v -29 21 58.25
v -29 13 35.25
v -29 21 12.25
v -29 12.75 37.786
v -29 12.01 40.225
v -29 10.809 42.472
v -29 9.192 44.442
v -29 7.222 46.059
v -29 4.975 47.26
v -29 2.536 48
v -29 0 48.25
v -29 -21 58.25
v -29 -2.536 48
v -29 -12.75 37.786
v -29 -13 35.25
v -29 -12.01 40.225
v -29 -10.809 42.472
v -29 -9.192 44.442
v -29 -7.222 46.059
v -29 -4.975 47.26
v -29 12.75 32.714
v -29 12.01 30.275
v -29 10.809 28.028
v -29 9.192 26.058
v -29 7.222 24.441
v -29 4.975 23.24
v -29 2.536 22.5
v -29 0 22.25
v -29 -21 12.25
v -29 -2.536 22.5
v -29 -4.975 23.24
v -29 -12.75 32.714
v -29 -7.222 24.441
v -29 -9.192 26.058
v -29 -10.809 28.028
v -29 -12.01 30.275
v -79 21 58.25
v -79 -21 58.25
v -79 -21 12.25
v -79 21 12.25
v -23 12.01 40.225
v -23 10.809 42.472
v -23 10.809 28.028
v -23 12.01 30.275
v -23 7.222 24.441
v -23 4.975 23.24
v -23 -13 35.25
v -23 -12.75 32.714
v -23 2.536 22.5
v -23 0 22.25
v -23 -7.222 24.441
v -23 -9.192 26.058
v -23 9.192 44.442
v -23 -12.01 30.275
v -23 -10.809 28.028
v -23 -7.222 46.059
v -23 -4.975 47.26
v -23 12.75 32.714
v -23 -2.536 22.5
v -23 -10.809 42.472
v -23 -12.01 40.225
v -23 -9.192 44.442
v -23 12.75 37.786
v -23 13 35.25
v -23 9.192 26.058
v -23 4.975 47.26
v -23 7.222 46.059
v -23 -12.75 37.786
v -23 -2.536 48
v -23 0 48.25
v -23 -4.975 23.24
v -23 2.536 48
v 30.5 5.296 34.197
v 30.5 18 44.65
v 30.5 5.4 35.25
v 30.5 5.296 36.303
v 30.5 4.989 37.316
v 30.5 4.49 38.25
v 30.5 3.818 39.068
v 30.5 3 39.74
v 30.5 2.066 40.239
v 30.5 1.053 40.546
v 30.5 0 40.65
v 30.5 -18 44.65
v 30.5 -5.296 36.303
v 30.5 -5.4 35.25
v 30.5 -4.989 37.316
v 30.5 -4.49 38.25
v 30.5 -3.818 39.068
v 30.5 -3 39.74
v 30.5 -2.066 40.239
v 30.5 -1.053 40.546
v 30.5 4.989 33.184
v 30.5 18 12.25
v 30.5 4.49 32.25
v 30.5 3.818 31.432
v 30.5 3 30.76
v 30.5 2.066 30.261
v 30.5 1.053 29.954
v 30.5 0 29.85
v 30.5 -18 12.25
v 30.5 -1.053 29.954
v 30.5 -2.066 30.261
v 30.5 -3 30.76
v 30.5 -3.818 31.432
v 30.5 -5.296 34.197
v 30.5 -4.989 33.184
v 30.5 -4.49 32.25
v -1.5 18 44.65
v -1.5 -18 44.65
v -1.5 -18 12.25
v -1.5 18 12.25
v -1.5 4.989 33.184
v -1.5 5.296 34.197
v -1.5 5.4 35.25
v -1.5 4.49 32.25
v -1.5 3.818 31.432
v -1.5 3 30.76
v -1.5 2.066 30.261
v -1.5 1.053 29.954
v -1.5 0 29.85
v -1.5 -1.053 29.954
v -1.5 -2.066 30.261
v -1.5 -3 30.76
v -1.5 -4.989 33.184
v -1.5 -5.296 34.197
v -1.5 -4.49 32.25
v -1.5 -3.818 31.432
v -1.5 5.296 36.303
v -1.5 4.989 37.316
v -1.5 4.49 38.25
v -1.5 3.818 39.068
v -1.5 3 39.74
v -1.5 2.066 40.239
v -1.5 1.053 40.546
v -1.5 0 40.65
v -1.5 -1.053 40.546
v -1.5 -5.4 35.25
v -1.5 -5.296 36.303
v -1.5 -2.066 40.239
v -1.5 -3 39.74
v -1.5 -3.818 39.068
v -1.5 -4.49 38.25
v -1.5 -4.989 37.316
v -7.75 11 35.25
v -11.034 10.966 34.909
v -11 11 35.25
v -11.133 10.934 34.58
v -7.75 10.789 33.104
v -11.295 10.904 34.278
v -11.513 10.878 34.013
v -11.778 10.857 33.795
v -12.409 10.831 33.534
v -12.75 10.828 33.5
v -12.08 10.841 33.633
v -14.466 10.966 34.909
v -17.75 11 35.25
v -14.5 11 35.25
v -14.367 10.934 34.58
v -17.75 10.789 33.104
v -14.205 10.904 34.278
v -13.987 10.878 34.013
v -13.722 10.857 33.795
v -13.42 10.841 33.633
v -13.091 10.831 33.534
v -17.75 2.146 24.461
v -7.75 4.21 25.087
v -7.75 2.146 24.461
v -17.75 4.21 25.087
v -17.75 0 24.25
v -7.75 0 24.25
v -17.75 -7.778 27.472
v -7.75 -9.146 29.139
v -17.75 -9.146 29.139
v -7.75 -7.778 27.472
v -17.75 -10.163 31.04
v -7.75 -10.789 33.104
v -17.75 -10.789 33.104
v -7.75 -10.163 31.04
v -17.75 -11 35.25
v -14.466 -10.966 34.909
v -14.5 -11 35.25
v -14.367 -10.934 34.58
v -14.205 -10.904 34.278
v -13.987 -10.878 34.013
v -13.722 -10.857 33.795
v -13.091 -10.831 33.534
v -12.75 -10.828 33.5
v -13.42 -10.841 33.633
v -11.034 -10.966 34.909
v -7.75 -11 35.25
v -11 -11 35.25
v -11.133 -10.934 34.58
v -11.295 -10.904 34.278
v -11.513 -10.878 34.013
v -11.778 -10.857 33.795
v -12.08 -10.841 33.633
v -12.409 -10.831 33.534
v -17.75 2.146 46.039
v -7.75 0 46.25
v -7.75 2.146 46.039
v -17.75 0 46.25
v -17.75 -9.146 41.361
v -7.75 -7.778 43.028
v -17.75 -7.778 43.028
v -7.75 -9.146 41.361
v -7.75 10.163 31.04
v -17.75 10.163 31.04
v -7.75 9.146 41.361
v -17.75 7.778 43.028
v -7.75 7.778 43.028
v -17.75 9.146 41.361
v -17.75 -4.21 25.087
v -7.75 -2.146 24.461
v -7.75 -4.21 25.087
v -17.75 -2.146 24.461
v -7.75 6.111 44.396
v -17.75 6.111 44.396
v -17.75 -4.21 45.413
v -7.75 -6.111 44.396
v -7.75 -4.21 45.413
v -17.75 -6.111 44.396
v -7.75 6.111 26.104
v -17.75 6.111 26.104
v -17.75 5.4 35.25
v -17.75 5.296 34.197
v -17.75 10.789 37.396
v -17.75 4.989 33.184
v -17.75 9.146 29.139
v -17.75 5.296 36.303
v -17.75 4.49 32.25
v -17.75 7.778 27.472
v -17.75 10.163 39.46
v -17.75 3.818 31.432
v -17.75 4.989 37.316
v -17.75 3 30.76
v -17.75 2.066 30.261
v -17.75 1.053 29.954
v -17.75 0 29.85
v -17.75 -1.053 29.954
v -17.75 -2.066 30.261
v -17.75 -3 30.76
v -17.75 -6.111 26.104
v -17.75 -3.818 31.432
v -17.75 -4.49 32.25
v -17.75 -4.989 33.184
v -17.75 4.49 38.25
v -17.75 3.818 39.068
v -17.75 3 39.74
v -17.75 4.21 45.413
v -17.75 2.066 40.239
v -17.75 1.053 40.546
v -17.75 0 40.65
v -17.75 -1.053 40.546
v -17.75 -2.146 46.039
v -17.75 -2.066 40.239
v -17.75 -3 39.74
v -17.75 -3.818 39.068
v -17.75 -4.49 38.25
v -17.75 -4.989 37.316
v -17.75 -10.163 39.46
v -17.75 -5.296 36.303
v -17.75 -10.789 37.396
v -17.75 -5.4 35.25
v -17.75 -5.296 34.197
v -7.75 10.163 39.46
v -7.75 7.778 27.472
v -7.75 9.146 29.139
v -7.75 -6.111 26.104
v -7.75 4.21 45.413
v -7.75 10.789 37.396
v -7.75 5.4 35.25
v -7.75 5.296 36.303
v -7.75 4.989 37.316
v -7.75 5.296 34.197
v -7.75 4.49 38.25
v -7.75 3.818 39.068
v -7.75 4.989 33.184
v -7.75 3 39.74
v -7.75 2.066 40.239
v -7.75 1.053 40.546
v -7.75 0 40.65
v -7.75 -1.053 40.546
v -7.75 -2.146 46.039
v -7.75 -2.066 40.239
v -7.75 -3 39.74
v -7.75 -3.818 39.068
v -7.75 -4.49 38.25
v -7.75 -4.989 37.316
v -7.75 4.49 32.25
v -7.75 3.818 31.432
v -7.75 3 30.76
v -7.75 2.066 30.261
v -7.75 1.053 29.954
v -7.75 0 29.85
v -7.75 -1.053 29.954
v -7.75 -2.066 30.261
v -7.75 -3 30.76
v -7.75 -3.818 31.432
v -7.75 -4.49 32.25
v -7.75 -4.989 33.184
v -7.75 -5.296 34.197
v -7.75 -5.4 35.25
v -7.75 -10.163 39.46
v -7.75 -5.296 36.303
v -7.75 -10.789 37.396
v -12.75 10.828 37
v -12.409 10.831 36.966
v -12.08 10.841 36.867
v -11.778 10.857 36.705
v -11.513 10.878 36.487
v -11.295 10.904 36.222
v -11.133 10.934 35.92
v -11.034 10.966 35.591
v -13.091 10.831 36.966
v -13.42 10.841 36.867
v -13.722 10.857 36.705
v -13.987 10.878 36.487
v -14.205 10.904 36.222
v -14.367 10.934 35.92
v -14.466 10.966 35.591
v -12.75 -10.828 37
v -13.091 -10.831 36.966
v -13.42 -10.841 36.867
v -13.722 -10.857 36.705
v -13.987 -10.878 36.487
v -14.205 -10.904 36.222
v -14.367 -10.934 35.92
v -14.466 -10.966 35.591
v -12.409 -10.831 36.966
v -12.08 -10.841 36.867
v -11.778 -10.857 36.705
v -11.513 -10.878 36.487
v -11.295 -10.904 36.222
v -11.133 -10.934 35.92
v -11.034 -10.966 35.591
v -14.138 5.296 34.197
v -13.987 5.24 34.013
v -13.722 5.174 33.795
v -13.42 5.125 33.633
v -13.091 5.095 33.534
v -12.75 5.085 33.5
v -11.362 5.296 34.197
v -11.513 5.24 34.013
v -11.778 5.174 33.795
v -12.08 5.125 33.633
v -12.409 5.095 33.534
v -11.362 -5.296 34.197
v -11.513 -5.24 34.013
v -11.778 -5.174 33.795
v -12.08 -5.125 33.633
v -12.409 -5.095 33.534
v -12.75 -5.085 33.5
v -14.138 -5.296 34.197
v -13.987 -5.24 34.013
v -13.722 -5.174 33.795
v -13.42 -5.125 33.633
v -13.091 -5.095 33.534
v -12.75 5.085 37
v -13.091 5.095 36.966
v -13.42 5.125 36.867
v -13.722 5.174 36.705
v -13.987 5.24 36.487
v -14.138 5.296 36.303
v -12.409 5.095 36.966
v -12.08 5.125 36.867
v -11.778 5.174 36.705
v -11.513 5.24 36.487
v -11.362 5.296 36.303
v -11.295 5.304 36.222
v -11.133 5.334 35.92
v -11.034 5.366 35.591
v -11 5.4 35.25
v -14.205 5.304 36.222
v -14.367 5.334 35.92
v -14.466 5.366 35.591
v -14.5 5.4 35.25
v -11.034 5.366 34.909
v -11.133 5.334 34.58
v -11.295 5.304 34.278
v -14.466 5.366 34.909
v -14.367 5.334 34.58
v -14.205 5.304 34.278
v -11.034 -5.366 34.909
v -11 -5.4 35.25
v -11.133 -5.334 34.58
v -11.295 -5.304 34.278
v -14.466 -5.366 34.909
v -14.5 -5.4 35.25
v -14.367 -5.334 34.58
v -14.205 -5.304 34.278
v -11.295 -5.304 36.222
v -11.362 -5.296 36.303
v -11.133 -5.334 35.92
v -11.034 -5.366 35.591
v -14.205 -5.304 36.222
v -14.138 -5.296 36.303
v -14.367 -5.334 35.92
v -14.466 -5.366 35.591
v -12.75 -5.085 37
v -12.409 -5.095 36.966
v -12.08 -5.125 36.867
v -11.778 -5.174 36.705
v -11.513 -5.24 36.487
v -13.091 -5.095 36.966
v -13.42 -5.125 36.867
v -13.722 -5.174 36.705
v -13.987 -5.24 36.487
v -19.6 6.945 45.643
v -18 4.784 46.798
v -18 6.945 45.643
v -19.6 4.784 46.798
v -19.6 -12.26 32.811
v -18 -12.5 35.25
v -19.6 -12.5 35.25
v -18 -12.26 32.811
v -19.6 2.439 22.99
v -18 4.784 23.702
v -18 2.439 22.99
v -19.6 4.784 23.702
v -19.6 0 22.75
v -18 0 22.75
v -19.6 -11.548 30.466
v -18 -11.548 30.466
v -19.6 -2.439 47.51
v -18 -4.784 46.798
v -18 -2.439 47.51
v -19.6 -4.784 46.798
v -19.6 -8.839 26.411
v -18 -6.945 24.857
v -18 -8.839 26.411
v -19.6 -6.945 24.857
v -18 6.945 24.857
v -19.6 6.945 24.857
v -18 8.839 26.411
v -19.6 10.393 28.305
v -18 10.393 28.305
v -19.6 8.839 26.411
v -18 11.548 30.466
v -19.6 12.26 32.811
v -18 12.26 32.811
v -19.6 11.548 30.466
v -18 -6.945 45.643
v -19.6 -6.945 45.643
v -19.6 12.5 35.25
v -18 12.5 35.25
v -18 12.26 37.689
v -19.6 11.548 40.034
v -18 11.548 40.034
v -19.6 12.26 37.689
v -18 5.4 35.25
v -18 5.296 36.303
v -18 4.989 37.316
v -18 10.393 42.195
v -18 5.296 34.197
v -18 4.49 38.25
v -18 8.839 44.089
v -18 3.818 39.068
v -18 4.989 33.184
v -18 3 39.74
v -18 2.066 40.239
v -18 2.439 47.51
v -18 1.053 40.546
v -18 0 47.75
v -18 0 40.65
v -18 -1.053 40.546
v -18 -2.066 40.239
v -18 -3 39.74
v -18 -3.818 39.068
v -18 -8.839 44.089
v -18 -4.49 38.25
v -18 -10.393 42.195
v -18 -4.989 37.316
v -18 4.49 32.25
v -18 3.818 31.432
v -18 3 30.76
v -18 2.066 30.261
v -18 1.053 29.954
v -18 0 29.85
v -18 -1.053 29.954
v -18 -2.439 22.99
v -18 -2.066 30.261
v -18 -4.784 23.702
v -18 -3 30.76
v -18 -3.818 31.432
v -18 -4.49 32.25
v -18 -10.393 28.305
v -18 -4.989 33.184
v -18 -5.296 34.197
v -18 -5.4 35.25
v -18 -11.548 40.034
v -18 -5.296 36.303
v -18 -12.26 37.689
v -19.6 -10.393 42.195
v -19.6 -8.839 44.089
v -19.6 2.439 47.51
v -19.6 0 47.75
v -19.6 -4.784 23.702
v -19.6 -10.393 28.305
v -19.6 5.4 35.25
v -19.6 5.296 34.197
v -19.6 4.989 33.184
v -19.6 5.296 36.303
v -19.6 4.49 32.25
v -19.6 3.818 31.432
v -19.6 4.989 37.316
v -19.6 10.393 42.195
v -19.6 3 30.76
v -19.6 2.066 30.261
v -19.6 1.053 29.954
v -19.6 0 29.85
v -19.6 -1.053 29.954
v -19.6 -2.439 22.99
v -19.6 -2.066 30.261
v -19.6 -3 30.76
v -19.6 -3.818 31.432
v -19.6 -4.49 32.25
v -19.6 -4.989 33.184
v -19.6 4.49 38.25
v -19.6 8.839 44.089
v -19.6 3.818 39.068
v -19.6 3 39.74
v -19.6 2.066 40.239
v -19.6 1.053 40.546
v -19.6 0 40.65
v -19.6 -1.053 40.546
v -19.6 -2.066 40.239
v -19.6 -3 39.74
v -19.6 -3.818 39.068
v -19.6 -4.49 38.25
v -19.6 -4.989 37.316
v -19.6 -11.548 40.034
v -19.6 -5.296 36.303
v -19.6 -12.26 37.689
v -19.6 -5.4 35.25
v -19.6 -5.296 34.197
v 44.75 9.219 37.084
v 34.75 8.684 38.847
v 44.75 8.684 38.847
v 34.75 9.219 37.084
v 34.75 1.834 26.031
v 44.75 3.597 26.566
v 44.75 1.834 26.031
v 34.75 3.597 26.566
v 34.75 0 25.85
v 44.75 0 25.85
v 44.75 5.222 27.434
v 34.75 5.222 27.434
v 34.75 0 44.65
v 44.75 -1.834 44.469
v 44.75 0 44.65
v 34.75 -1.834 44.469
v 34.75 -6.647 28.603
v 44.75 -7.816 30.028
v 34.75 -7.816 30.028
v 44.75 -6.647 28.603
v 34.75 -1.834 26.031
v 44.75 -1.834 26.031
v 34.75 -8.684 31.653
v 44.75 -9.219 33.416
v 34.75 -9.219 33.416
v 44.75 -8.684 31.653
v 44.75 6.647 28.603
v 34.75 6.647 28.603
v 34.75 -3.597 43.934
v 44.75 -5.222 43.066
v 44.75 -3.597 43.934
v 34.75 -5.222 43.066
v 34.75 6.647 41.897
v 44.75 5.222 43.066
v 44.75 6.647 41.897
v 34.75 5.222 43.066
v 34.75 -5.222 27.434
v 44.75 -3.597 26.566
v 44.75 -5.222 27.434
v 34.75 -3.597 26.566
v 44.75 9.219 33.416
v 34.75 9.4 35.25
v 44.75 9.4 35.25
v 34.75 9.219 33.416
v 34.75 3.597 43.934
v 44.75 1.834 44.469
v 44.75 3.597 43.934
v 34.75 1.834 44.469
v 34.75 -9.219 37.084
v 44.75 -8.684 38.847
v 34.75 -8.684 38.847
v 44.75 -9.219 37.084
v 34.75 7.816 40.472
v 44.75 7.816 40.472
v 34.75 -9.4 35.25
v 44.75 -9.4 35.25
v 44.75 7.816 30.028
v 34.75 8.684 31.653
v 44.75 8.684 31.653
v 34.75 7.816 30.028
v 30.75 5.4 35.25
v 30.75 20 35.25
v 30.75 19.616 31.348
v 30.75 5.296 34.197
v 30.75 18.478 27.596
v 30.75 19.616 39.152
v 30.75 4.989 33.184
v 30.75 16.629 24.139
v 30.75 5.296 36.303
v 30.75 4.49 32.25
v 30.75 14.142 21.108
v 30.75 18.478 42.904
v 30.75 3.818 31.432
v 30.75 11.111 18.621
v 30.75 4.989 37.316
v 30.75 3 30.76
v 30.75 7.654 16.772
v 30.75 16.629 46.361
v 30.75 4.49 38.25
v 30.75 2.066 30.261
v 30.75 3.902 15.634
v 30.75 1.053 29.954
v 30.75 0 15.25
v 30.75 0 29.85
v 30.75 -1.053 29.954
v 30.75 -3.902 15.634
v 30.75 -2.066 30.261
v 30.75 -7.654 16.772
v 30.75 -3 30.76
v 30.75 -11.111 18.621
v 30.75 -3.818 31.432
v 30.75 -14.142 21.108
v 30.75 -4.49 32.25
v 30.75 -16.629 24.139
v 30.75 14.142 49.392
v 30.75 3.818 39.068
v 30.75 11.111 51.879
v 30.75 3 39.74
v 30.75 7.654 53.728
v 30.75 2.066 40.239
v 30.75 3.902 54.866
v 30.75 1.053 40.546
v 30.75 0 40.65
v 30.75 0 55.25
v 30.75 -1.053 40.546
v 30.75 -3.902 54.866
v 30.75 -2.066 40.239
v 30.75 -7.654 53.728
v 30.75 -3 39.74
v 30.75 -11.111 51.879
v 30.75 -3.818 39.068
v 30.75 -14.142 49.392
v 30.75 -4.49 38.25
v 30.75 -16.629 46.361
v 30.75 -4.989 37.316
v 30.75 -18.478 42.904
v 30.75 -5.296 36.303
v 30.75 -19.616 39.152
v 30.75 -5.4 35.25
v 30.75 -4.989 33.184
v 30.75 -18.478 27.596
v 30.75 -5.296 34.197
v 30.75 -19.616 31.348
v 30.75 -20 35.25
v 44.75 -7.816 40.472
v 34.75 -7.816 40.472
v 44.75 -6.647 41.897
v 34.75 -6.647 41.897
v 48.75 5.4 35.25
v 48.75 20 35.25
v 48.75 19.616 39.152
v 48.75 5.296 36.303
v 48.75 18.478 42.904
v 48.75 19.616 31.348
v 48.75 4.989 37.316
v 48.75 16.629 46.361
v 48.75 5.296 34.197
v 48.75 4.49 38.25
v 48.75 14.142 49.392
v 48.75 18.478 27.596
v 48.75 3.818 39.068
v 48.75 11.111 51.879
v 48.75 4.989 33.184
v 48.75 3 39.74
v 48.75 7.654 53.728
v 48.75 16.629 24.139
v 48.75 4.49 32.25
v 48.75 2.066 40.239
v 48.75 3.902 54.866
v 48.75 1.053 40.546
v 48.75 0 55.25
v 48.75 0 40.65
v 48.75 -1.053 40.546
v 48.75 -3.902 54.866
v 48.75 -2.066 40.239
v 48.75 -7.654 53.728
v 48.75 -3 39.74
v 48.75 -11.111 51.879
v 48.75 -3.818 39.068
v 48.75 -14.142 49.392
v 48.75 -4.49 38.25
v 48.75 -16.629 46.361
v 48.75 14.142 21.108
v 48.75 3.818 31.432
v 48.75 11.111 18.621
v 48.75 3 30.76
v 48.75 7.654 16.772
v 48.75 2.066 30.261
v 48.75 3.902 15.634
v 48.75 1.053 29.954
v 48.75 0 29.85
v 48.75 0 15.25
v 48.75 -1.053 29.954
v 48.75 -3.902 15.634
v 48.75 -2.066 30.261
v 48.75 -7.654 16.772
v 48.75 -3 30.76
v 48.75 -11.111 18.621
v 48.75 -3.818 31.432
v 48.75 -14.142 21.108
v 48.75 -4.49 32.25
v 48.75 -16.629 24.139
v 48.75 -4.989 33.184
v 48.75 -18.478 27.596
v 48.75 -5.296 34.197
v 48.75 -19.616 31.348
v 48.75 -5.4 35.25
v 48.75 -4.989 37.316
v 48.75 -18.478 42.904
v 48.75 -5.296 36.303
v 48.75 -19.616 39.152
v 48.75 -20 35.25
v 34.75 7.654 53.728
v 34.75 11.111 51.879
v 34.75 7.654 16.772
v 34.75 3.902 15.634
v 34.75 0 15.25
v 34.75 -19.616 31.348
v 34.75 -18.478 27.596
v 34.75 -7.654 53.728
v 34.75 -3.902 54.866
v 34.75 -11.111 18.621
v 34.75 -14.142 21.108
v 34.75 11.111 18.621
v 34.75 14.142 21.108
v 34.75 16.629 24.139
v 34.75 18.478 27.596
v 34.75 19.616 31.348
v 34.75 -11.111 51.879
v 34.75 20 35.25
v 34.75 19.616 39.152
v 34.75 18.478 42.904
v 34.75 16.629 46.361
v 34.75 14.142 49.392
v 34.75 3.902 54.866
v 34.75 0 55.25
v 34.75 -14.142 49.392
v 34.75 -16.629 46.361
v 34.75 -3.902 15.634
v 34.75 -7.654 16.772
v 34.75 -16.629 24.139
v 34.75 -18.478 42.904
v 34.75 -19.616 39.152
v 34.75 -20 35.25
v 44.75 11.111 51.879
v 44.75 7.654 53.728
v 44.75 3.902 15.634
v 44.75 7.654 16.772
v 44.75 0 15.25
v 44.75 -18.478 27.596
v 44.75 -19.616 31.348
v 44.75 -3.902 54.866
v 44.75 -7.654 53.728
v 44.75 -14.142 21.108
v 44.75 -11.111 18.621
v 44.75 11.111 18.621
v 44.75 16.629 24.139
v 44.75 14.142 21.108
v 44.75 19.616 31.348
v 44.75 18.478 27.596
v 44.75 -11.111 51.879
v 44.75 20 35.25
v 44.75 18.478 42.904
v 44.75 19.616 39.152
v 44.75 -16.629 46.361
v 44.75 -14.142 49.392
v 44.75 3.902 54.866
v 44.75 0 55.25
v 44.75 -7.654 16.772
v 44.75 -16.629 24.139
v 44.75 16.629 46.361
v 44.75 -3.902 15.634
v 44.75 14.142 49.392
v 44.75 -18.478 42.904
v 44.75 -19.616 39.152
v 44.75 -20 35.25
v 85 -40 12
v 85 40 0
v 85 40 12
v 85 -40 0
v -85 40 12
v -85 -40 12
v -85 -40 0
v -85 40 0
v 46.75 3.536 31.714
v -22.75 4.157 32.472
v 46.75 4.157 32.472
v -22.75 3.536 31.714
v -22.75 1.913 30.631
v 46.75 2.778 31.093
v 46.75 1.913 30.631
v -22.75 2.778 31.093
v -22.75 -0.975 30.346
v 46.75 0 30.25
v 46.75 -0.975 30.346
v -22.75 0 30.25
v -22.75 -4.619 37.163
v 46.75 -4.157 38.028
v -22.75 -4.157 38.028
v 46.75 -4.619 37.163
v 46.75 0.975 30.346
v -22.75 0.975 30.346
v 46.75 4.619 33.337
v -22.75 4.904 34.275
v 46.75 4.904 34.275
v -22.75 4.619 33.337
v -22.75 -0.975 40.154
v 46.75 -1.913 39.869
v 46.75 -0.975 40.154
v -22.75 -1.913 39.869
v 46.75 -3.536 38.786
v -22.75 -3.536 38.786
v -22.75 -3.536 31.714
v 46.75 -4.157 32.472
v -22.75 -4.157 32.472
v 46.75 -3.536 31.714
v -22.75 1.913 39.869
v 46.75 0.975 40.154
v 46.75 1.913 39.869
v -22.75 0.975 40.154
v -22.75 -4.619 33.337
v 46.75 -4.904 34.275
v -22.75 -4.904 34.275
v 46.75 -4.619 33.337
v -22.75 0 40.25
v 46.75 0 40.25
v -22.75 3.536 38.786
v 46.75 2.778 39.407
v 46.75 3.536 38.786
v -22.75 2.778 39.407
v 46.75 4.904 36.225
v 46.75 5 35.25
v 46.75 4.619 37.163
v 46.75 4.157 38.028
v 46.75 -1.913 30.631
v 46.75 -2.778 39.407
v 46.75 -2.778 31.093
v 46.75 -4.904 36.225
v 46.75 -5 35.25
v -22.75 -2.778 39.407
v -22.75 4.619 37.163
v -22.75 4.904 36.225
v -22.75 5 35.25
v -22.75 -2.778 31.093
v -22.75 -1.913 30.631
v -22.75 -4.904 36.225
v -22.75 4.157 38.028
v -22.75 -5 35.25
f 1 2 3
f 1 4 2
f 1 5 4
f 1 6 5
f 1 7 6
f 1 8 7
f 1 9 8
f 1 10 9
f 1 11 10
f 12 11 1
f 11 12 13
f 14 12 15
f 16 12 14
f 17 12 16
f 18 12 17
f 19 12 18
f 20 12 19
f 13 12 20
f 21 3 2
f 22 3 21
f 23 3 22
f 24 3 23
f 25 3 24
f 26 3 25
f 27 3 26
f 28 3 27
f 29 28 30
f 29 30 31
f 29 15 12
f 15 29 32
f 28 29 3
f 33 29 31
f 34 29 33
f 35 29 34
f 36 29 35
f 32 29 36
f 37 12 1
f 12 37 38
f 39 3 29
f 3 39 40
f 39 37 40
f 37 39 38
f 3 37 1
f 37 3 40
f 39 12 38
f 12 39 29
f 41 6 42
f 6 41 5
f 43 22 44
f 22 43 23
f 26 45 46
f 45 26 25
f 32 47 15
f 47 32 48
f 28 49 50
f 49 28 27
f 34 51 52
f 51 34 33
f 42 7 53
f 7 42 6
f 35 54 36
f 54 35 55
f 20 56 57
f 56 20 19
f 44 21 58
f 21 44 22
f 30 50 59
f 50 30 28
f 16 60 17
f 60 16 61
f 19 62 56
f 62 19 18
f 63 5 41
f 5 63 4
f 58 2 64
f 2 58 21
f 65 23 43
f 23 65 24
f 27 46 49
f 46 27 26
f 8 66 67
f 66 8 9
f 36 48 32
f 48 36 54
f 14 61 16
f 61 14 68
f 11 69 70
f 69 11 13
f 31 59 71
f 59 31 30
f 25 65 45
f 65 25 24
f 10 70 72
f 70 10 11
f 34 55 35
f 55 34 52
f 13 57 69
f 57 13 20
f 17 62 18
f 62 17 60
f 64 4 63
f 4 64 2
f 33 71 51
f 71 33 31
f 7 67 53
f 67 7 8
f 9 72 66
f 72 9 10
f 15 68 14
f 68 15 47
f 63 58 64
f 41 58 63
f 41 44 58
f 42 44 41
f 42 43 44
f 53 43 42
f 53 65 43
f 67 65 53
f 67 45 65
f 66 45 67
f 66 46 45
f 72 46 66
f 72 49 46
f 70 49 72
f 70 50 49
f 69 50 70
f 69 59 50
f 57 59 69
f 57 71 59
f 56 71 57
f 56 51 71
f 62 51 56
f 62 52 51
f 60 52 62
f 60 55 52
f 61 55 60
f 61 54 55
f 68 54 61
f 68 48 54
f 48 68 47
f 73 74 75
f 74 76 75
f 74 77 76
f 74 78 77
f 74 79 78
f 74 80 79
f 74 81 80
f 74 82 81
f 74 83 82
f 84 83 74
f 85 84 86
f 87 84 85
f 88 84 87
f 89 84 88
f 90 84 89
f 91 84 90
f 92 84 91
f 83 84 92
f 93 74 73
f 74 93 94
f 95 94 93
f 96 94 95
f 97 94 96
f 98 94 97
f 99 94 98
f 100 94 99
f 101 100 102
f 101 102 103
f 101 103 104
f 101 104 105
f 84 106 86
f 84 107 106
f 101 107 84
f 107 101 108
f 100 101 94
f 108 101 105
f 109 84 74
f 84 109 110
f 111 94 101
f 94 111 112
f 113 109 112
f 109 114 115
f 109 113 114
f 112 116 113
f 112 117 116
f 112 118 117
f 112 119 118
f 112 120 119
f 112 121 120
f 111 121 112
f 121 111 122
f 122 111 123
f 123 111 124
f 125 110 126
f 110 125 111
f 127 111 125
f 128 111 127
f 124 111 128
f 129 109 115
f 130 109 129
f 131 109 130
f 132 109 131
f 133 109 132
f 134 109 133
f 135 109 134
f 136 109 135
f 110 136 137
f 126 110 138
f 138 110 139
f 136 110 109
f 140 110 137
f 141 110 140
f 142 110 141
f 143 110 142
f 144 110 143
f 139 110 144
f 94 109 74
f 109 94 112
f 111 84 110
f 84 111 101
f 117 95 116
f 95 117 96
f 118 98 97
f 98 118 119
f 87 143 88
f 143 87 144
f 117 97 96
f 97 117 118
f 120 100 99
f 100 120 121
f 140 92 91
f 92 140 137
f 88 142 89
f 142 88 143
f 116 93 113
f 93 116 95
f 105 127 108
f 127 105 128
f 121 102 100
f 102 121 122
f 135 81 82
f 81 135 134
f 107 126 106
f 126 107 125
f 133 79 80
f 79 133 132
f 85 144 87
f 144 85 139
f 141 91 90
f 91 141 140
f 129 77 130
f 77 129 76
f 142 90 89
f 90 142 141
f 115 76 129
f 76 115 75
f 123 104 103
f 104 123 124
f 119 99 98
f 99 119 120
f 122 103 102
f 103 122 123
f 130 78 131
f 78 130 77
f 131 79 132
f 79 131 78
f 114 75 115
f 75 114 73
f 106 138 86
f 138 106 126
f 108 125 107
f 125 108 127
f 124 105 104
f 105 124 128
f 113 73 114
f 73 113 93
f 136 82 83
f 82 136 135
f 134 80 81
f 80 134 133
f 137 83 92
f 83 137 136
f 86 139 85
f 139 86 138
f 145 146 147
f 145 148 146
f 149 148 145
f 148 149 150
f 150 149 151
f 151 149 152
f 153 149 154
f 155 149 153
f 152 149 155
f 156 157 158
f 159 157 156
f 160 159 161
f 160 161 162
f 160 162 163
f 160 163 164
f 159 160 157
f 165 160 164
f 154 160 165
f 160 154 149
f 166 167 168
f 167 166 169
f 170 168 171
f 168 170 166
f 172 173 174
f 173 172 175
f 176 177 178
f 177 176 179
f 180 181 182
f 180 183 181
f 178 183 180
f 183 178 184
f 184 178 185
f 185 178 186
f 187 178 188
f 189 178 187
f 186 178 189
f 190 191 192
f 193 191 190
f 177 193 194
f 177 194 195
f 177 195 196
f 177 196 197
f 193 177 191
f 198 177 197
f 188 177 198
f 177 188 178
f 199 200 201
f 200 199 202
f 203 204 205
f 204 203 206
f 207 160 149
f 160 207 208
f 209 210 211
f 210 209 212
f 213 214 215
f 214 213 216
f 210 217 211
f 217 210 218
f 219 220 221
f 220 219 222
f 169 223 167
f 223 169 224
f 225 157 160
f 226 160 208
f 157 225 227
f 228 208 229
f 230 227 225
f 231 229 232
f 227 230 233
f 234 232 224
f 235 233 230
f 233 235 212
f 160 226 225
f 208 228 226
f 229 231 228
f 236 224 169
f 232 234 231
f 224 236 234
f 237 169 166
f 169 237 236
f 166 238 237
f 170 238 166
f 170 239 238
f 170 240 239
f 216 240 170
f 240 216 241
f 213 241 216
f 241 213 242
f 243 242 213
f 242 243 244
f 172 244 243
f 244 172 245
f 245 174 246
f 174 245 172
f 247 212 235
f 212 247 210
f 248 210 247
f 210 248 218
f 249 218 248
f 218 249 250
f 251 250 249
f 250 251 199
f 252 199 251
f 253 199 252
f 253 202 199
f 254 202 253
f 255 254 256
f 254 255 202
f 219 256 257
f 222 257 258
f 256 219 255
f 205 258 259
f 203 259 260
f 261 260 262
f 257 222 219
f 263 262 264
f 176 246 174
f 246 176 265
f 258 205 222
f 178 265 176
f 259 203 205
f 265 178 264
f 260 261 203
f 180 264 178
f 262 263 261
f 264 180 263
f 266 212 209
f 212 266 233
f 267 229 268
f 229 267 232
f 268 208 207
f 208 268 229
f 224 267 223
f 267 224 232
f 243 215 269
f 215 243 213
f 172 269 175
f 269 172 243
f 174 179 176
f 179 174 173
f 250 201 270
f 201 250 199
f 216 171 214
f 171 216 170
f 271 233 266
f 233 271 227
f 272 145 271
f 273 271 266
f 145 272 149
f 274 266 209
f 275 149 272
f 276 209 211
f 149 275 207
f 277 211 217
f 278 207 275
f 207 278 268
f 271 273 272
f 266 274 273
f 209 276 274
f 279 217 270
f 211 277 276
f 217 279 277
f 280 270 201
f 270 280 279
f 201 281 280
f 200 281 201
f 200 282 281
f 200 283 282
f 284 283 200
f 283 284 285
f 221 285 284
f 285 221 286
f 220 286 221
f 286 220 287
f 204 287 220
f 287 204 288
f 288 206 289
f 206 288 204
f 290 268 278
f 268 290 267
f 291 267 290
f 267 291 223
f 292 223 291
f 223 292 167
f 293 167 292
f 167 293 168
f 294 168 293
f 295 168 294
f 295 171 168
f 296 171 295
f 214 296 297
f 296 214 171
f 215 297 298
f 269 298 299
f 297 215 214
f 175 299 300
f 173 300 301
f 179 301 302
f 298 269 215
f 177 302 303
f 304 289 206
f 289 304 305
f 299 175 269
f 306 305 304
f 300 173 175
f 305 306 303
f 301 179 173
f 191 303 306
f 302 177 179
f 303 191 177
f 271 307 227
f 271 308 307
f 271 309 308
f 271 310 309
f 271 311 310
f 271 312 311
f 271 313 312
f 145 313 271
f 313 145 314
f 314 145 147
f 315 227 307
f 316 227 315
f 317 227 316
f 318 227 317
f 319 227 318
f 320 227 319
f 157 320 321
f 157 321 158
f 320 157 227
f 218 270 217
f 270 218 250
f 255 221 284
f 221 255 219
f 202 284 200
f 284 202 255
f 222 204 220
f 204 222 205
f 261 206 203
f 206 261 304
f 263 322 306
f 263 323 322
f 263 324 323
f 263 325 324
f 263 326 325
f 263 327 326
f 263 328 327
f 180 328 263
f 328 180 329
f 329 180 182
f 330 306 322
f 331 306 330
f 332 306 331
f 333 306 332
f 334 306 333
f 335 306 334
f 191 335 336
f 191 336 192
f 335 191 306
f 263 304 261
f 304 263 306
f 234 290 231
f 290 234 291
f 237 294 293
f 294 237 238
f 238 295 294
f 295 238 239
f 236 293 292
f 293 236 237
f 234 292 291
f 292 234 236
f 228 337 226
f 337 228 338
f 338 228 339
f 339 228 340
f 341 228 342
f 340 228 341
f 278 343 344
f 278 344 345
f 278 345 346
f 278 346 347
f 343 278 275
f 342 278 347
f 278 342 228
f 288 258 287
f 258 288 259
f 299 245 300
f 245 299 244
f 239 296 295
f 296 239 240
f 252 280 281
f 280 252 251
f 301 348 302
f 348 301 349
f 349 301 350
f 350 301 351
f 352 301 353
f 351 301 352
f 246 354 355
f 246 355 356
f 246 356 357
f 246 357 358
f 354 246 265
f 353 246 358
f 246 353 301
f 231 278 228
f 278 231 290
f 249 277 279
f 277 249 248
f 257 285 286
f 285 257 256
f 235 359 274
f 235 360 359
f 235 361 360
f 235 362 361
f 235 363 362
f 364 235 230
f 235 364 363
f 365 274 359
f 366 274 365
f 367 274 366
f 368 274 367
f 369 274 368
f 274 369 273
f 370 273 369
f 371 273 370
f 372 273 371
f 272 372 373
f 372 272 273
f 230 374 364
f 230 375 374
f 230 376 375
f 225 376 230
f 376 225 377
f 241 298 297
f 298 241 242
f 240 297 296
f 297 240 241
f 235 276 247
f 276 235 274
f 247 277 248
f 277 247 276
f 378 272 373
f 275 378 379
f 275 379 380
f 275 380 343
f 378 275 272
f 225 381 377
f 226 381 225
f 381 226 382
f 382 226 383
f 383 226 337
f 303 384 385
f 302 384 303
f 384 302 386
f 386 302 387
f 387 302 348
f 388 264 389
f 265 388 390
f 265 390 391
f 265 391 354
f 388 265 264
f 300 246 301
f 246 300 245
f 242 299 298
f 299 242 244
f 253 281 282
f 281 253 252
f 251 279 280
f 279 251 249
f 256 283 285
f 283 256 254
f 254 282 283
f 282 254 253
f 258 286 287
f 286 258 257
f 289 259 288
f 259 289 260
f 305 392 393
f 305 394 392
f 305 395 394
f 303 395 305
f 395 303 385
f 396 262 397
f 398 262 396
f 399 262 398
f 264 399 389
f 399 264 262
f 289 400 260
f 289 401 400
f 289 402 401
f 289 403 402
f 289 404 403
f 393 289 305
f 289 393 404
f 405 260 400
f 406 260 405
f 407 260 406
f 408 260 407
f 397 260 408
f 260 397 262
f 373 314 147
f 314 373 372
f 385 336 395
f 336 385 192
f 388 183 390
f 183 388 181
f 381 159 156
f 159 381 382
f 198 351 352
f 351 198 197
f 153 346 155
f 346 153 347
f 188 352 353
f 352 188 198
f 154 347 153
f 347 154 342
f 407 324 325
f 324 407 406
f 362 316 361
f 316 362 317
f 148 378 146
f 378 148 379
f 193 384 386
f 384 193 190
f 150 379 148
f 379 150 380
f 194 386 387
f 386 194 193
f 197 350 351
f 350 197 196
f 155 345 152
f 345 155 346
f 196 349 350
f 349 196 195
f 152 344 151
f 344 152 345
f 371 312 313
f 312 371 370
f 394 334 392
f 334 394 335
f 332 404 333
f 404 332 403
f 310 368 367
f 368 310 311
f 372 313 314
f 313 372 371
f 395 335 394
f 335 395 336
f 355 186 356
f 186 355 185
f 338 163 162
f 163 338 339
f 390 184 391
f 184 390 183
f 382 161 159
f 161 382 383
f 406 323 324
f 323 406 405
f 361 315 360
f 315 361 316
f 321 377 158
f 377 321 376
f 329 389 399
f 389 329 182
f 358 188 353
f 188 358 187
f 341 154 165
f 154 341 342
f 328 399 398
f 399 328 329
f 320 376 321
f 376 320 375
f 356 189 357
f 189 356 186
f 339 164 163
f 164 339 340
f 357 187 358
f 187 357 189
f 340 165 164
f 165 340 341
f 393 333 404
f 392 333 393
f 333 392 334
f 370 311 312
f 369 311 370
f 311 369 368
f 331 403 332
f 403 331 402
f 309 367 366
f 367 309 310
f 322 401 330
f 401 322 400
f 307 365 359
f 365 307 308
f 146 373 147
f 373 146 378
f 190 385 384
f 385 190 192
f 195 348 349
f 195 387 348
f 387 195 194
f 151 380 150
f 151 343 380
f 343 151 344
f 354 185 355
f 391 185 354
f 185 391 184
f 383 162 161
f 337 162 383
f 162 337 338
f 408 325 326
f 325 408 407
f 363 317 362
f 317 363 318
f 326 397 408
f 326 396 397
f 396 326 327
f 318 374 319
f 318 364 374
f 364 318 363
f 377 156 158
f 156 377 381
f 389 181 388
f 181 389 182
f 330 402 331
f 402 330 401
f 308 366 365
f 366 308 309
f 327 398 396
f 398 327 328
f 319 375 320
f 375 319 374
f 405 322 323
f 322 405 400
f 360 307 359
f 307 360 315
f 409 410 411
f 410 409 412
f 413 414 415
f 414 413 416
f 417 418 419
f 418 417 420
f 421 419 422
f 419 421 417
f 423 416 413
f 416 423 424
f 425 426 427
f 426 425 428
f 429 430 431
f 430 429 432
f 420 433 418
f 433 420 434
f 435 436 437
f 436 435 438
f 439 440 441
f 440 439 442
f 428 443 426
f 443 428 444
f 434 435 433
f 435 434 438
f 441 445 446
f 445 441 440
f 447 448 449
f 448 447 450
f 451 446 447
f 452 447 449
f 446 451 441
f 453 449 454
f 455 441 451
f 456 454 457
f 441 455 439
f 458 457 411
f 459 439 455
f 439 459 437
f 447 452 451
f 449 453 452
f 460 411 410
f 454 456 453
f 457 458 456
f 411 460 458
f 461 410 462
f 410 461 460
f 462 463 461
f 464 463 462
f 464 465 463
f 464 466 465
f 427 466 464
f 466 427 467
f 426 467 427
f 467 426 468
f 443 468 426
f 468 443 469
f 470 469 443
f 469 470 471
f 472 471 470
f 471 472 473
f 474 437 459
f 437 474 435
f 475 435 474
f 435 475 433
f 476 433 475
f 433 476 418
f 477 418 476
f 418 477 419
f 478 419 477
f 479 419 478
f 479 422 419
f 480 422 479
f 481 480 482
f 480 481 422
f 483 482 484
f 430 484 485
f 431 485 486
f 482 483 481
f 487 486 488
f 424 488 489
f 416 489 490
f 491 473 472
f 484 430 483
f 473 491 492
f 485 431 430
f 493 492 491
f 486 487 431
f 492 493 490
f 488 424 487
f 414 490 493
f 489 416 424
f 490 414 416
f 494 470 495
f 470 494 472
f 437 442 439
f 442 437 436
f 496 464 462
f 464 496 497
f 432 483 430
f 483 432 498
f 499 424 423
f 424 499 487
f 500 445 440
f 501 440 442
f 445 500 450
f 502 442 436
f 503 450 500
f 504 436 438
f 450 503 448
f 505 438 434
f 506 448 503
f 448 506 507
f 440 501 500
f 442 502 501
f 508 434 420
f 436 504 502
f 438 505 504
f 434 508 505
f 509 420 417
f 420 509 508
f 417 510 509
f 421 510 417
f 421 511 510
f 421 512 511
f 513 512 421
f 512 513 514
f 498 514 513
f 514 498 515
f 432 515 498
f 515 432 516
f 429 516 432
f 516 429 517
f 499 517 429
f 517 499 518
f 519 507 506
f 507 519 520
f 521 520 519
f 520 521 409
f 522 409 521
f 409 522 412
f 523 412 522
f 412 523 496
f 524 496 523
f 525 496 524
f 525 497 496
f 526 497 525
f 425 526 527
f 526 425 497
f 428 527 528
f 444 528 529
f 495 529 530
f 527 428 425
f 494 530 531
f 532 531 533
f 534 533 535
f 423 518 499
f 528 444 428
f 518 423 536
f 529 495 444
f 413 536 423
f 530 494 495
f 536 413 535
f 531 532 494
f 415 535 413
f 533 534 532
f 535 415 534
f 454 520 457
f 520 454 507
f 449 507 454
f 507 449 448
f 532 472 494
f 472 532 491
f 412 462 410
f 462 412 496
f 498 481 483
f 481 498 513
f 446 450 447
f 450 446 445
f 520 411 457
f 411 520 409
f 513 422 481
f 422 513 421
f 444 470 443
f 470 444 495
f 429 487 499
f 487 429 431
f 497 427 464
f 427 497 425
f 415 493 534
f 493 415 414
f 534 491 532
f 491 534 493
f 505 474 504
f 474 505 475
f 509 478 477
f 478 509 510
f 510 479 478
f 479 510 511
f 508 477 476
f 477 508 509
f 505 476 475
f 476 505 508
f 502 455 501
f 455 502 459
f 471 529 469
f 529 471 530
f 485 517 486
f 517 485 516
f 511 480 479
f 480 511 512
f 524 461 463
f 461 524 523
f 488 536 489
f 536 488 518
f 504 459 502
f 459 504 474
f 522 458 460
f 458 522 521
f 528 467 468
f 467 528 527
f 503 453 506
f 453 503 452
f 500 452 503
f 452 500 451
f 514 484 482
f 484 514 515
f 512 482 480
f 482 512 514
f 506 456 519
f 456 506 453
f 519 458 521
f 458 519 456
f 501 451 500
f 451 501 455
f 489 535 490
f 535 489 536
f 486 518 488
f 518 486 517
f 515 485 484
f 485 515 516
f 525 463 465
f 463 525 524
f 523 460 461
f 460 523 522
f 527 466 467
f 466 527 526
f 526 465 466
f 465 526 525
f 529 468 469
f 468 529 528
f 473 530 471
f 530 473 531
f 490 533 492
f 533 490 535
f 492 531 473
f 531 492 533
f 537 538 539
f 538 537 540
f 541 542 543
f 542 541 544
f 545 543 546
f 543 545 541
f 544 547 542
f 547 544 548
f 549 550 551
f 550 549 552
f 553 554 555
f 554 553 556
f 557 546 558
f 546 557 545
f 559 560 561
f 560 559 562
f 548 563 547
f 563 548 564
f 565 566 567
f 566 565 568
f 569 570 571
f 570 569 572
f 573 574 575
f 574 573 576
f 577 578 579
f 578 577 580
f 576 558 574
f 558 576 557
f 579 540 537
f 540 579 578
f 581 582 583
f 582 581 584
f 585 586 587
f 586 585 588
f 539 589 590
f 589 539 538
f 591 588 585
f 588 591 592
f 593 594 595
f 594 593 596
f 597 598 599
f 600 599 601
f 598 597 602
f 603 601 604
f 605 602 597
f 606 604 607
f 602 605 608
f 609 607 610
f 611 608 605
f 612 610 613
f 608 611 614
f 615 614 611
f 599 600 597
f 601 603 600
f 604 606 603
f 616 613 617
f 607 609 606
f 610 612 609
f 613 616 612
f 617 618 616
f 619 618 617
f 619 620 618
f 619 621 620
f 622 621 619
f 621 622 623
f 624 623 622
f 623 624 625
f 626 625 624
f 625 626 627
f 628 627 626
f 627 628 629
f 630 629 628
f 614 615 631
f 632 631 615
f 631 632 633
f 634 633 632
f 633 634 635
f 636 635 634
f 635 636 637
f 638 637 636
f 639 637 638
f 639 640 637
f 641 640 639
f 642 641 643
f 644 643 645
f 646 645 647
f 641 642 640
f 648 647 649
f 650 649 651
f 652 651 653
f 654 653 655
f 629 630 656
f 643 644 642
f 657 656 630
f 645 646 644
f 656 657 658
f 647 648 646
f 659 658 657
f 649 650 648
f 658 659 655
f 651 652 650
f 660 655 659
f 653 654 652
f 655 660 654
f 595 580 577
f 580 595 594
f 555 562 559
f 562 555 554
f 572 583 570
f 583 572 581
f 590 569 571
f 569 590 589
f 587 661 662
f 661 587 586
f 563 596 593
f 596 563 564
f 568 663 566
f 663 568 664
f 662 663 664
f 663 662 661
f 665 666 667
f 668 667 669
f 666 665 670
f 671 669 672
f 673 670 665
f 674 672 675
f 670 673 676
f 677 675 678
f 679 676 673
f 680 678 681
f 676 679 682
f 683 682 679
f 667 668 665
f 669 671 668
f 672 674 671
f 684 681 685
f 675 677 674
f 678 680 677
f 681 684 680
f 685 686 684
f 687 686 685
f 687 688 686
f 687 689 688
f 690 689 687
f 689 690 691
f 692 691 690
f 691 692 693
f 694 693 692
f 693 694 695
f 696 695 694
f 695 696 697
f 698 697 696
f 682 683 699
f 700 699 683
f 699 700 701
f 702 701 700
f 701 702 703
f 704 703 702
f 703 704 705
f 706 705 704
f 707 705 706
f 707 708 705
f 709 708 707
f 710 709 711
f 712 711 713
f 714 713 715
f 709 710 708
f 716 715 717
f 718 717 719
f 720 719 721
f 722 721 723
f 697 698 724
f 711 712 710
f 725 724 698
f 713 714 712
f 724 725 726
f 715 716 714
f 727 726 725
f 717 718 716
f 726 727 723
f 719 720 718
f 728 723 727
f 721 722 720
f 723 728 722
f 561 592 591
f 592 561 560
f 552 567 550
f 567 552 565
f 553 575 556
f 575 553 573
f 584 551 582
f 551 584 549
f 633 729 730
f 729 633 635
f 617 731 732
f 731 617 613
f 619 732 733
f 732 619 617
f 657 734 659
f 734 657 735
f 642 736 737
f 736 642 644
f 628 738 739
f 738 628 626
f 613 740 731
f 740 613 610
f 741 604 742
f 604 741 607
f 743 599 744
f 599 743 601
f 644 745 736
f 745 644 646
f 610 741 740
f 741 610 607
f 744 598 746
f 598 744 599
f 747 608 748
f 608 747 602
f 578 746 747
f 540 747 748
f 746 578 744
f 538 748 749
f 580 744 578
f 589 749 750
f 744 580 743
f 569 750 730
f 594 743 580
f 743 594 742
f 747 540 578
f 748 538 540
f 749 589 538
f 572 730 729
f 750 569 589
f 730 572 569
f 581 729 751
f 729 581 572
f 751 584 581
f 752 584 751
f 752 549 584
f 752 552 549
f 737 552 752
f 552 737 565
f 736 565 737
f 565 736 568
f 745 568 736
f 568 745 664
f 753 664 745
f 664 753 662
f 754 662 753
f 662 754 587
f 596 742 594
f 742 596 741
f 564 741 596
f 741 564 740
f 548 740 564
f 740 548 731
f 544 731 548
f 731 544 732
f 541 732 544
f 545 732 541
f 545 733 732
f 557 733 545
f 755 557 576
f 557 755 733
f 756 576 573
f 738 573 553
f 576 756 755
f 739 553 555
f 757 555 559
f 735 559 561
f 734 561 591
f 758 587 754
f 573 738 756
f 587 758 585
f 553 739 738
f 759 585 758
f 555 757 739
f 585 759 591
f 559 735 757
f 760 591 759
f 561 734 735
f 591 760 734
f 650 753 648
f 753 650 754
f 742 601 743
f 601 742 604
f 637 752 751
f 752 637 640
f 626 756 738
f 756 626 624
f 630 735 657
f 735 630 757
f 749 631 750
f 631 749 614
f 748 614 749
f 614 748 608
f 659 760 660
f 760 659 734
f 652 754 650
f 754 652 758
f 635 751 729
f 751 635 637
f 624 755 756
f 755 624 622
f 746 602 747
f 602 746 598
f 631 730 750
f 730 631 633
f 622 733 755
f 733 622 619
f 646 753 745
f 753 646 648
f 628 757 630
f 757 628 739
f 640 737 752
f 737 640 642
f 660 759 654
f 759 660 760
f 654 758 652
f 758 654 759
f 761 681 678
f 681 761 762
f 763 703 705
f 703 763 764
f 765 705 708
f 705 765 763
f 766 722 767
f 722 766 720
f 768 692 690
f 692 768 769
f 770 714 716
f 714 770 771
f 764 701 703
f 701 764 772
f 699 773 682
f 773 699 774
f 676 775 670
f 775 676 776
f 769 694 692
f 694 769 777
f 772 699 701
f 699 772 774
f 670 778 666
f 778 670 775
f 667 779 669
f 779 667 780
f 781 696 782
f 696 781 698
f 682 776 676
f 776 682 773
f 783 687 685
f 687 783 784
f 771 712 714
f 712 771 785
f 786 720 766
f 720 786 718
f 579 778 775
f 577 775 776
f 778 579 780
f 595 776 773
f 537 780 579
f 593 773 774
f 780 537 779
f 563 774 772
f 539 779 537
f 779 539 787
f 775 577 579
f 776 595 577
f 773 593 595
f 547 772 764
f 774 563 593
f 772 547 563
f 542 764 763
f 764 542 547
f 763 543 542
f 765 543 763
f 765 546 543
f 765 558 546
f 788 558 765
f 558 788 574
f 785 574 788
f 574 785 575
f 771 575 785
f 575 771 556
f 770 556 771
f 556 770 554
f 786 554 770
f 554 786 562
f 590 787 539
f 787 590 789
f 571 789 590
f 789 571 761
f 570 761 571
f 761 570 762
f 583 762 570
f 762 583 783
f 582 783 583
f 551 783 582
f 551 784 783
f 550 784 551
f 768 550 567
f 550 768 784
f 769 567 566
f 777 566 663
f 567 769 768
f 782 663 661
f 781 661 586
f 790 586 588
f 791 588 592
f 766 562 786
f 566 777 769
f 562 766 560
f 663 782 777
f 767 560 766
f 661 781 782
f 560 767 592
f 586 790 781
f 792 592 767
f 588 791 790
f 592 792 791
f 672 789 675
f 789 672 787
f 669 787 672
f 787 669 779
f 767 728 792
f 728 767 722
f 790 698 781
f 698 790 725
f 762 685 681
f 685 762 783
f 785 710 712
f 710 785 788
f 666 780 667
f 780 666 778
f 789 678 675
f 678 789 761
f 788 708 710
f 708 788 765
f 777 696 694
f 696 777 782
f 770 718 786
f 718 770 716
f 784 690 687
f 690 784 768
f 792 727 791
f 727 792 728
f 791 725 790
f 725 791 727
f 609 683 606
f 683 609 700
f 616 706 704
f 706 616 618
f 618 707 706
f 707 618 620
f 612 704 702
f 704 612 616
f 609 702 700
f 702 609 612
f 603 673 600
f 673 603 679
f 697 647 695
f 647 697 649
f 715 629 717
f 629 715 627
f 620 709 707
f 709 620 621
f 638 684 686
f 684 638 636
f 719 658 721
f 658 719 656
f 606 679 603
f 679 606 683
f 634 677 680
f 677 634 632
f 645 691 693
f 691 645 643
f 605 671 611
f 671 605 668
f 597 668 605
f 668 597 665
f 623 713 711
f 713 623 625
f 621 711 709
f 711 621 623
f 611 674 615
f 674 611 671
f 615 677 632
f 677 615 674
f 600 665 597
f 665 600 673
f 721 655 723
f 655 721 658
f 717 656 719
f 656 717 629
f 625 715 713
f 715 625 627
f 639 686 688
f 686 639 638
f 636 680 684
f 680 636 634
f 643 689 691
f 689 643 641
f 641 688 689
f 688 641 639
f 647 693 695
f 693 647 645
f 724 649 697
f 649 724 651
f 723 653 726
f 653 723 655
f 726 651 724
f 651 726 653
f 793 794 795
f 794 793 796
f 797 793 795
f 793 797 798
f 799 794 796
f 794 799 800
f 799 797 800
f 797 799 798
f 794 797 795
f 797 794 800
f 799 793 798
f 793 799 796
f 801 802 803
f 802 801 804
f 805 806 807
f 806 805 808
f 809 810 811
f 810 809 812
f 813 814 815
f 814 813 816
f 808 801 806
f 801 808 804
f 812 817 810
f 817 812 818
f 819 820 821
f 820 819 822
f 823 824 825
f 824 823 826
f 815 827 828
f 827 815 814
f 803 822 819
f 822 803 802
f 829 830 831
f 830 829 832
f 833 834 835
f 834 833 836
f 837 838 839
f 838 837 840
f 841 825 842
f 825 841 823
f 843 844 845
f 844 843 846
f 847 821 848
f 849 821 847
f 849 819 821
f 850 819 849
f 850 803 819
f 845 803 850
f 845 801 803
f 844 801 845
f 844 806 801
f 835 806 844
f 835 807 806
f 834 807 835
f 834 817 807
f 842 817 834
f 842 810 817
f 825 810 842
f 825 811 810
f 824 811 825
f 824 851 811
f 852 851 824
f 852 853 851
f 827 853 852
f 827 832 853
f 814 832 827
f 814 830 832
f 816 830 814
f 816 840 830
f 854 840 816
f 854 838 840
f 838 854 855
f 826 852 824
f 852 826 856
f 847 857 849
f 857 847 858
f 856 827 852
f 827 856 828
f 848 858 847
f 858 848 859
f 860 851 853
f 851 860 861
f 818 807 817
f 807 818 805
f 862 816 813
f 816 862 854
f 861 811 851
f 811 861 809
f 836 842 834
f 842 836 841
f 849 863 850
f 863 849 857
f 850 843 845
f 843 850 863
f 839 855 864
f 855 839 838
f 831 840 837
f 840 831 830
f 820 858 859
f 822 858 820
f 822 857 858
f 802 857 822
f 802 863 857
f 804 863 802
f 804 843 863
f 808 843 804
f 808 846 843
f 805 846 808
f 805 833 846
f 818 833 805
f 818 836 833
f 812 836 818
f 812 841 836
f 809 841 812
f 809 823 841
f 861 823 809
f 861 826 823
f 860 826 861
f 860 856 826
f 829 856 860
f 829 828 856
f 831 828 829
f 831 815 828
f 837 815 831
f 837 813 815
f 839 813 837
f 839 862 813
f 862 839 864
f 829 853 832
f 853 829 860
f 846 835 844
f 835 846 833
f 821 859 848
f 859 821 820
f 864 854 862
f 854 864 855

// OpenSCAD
$fn = 32;

// ------------------------------------------------------------------------
// Motor drive station: motor 50 x 46 mm, shaft d10, pulley d40
// Every part is its own module, assembly() places every instance.
// ------------------------------------------------------------------------

// --- part 1 ---
module station_bed() {
  difference() {
    translate([-85, -40, 0]) cube([170, 80, 12]);
  }
}

// --- part 2 ---
module drive_motor() {
  union() {
    translate([-25, -21, 0]) cube([50, 42, 46]);
    translate([28, 0, 23]) rotate([0, 90, 0]) cylinder(h = 6, d = 26, center = true);
  }
}

// --- part 3 ---
module pillow_block() {
  difference() {
    translate([-16, -18, 0]) cube([32, 36, 32.4]);
    translate([0, 0, 23]) rotate([0, 90, 0]) cylinder(h = 34, d = 10.8, center = true);
  }
}

// --- part 4 ---
module drive_shaft() {
  translate([0, 0, -34.75]) cylinder(h = 69.5, d = 10);
}

// --- part 5 ---
module shaft_collar() {
  difference() {
    cylinder(h = 10, d = 22);
    translate([0, 0, -1]) cylinder(h = 12, d = 10.8);
    translate([0, 0, 5]) rotate([90, 0, 0]) cylinder(h = 24, d = 3.5, center = true);
  }
}

// --- part 6 ---
module collar_washer() {
  difference() {
      translate([0, 0, 0]) cylinder(h = 1.6, d = 25);
      translate([0, 0, -1]) cylinder(h = 3.6, d = 10.8);
    }
}

// --- part 7 ---
module drive_pulley() {
  difference() {
    union() {
      cylinder(h = 18, d = 18.8);
      cylinder(h = 4, d = 40);
      translate([0, 0, 14]) cylinder(h = 4, d = 40);
    }
    translate([0, 0, -1]) cylinder(h = 20, d = 10.8);
  }
}

// --- assembly ---
module assembly() {
  color([0.80, 0.24, 0.20]) translate([0, 0, 0]) rotate([0, 0, 0]) station_bed();
  color([0.20, 0.45, 0.75]) translate([-54, 0, 12.25]) rotate([0, 0, 0]) drive_motor();
  color([0.25, 0.62, 0.32]) translate([14.5, 0, 12.25]) rotate([0, 0, 0]) pillow_block();
  color([0.92, 0.70, 0.18]) translate([12, 0, 35.25]) rotate([0, 90, 0]) drive_shaft();
  color([0.58, 0.35, 0.70]) translate([-17.75, 0, 35.25]) rotate([0, 90, 0]) shaft_collar();
  color([0.16, 0.66, 0.66]) translate([-19.6, 0, 35.25]) rotate([0, 90, 0]) collar_washer();
  color([0.85, 0.48, 0.18]) translate([30.75, 0, 35.25]) rotate([0, 90, 0]) drive_pulley();
}

assembly();
